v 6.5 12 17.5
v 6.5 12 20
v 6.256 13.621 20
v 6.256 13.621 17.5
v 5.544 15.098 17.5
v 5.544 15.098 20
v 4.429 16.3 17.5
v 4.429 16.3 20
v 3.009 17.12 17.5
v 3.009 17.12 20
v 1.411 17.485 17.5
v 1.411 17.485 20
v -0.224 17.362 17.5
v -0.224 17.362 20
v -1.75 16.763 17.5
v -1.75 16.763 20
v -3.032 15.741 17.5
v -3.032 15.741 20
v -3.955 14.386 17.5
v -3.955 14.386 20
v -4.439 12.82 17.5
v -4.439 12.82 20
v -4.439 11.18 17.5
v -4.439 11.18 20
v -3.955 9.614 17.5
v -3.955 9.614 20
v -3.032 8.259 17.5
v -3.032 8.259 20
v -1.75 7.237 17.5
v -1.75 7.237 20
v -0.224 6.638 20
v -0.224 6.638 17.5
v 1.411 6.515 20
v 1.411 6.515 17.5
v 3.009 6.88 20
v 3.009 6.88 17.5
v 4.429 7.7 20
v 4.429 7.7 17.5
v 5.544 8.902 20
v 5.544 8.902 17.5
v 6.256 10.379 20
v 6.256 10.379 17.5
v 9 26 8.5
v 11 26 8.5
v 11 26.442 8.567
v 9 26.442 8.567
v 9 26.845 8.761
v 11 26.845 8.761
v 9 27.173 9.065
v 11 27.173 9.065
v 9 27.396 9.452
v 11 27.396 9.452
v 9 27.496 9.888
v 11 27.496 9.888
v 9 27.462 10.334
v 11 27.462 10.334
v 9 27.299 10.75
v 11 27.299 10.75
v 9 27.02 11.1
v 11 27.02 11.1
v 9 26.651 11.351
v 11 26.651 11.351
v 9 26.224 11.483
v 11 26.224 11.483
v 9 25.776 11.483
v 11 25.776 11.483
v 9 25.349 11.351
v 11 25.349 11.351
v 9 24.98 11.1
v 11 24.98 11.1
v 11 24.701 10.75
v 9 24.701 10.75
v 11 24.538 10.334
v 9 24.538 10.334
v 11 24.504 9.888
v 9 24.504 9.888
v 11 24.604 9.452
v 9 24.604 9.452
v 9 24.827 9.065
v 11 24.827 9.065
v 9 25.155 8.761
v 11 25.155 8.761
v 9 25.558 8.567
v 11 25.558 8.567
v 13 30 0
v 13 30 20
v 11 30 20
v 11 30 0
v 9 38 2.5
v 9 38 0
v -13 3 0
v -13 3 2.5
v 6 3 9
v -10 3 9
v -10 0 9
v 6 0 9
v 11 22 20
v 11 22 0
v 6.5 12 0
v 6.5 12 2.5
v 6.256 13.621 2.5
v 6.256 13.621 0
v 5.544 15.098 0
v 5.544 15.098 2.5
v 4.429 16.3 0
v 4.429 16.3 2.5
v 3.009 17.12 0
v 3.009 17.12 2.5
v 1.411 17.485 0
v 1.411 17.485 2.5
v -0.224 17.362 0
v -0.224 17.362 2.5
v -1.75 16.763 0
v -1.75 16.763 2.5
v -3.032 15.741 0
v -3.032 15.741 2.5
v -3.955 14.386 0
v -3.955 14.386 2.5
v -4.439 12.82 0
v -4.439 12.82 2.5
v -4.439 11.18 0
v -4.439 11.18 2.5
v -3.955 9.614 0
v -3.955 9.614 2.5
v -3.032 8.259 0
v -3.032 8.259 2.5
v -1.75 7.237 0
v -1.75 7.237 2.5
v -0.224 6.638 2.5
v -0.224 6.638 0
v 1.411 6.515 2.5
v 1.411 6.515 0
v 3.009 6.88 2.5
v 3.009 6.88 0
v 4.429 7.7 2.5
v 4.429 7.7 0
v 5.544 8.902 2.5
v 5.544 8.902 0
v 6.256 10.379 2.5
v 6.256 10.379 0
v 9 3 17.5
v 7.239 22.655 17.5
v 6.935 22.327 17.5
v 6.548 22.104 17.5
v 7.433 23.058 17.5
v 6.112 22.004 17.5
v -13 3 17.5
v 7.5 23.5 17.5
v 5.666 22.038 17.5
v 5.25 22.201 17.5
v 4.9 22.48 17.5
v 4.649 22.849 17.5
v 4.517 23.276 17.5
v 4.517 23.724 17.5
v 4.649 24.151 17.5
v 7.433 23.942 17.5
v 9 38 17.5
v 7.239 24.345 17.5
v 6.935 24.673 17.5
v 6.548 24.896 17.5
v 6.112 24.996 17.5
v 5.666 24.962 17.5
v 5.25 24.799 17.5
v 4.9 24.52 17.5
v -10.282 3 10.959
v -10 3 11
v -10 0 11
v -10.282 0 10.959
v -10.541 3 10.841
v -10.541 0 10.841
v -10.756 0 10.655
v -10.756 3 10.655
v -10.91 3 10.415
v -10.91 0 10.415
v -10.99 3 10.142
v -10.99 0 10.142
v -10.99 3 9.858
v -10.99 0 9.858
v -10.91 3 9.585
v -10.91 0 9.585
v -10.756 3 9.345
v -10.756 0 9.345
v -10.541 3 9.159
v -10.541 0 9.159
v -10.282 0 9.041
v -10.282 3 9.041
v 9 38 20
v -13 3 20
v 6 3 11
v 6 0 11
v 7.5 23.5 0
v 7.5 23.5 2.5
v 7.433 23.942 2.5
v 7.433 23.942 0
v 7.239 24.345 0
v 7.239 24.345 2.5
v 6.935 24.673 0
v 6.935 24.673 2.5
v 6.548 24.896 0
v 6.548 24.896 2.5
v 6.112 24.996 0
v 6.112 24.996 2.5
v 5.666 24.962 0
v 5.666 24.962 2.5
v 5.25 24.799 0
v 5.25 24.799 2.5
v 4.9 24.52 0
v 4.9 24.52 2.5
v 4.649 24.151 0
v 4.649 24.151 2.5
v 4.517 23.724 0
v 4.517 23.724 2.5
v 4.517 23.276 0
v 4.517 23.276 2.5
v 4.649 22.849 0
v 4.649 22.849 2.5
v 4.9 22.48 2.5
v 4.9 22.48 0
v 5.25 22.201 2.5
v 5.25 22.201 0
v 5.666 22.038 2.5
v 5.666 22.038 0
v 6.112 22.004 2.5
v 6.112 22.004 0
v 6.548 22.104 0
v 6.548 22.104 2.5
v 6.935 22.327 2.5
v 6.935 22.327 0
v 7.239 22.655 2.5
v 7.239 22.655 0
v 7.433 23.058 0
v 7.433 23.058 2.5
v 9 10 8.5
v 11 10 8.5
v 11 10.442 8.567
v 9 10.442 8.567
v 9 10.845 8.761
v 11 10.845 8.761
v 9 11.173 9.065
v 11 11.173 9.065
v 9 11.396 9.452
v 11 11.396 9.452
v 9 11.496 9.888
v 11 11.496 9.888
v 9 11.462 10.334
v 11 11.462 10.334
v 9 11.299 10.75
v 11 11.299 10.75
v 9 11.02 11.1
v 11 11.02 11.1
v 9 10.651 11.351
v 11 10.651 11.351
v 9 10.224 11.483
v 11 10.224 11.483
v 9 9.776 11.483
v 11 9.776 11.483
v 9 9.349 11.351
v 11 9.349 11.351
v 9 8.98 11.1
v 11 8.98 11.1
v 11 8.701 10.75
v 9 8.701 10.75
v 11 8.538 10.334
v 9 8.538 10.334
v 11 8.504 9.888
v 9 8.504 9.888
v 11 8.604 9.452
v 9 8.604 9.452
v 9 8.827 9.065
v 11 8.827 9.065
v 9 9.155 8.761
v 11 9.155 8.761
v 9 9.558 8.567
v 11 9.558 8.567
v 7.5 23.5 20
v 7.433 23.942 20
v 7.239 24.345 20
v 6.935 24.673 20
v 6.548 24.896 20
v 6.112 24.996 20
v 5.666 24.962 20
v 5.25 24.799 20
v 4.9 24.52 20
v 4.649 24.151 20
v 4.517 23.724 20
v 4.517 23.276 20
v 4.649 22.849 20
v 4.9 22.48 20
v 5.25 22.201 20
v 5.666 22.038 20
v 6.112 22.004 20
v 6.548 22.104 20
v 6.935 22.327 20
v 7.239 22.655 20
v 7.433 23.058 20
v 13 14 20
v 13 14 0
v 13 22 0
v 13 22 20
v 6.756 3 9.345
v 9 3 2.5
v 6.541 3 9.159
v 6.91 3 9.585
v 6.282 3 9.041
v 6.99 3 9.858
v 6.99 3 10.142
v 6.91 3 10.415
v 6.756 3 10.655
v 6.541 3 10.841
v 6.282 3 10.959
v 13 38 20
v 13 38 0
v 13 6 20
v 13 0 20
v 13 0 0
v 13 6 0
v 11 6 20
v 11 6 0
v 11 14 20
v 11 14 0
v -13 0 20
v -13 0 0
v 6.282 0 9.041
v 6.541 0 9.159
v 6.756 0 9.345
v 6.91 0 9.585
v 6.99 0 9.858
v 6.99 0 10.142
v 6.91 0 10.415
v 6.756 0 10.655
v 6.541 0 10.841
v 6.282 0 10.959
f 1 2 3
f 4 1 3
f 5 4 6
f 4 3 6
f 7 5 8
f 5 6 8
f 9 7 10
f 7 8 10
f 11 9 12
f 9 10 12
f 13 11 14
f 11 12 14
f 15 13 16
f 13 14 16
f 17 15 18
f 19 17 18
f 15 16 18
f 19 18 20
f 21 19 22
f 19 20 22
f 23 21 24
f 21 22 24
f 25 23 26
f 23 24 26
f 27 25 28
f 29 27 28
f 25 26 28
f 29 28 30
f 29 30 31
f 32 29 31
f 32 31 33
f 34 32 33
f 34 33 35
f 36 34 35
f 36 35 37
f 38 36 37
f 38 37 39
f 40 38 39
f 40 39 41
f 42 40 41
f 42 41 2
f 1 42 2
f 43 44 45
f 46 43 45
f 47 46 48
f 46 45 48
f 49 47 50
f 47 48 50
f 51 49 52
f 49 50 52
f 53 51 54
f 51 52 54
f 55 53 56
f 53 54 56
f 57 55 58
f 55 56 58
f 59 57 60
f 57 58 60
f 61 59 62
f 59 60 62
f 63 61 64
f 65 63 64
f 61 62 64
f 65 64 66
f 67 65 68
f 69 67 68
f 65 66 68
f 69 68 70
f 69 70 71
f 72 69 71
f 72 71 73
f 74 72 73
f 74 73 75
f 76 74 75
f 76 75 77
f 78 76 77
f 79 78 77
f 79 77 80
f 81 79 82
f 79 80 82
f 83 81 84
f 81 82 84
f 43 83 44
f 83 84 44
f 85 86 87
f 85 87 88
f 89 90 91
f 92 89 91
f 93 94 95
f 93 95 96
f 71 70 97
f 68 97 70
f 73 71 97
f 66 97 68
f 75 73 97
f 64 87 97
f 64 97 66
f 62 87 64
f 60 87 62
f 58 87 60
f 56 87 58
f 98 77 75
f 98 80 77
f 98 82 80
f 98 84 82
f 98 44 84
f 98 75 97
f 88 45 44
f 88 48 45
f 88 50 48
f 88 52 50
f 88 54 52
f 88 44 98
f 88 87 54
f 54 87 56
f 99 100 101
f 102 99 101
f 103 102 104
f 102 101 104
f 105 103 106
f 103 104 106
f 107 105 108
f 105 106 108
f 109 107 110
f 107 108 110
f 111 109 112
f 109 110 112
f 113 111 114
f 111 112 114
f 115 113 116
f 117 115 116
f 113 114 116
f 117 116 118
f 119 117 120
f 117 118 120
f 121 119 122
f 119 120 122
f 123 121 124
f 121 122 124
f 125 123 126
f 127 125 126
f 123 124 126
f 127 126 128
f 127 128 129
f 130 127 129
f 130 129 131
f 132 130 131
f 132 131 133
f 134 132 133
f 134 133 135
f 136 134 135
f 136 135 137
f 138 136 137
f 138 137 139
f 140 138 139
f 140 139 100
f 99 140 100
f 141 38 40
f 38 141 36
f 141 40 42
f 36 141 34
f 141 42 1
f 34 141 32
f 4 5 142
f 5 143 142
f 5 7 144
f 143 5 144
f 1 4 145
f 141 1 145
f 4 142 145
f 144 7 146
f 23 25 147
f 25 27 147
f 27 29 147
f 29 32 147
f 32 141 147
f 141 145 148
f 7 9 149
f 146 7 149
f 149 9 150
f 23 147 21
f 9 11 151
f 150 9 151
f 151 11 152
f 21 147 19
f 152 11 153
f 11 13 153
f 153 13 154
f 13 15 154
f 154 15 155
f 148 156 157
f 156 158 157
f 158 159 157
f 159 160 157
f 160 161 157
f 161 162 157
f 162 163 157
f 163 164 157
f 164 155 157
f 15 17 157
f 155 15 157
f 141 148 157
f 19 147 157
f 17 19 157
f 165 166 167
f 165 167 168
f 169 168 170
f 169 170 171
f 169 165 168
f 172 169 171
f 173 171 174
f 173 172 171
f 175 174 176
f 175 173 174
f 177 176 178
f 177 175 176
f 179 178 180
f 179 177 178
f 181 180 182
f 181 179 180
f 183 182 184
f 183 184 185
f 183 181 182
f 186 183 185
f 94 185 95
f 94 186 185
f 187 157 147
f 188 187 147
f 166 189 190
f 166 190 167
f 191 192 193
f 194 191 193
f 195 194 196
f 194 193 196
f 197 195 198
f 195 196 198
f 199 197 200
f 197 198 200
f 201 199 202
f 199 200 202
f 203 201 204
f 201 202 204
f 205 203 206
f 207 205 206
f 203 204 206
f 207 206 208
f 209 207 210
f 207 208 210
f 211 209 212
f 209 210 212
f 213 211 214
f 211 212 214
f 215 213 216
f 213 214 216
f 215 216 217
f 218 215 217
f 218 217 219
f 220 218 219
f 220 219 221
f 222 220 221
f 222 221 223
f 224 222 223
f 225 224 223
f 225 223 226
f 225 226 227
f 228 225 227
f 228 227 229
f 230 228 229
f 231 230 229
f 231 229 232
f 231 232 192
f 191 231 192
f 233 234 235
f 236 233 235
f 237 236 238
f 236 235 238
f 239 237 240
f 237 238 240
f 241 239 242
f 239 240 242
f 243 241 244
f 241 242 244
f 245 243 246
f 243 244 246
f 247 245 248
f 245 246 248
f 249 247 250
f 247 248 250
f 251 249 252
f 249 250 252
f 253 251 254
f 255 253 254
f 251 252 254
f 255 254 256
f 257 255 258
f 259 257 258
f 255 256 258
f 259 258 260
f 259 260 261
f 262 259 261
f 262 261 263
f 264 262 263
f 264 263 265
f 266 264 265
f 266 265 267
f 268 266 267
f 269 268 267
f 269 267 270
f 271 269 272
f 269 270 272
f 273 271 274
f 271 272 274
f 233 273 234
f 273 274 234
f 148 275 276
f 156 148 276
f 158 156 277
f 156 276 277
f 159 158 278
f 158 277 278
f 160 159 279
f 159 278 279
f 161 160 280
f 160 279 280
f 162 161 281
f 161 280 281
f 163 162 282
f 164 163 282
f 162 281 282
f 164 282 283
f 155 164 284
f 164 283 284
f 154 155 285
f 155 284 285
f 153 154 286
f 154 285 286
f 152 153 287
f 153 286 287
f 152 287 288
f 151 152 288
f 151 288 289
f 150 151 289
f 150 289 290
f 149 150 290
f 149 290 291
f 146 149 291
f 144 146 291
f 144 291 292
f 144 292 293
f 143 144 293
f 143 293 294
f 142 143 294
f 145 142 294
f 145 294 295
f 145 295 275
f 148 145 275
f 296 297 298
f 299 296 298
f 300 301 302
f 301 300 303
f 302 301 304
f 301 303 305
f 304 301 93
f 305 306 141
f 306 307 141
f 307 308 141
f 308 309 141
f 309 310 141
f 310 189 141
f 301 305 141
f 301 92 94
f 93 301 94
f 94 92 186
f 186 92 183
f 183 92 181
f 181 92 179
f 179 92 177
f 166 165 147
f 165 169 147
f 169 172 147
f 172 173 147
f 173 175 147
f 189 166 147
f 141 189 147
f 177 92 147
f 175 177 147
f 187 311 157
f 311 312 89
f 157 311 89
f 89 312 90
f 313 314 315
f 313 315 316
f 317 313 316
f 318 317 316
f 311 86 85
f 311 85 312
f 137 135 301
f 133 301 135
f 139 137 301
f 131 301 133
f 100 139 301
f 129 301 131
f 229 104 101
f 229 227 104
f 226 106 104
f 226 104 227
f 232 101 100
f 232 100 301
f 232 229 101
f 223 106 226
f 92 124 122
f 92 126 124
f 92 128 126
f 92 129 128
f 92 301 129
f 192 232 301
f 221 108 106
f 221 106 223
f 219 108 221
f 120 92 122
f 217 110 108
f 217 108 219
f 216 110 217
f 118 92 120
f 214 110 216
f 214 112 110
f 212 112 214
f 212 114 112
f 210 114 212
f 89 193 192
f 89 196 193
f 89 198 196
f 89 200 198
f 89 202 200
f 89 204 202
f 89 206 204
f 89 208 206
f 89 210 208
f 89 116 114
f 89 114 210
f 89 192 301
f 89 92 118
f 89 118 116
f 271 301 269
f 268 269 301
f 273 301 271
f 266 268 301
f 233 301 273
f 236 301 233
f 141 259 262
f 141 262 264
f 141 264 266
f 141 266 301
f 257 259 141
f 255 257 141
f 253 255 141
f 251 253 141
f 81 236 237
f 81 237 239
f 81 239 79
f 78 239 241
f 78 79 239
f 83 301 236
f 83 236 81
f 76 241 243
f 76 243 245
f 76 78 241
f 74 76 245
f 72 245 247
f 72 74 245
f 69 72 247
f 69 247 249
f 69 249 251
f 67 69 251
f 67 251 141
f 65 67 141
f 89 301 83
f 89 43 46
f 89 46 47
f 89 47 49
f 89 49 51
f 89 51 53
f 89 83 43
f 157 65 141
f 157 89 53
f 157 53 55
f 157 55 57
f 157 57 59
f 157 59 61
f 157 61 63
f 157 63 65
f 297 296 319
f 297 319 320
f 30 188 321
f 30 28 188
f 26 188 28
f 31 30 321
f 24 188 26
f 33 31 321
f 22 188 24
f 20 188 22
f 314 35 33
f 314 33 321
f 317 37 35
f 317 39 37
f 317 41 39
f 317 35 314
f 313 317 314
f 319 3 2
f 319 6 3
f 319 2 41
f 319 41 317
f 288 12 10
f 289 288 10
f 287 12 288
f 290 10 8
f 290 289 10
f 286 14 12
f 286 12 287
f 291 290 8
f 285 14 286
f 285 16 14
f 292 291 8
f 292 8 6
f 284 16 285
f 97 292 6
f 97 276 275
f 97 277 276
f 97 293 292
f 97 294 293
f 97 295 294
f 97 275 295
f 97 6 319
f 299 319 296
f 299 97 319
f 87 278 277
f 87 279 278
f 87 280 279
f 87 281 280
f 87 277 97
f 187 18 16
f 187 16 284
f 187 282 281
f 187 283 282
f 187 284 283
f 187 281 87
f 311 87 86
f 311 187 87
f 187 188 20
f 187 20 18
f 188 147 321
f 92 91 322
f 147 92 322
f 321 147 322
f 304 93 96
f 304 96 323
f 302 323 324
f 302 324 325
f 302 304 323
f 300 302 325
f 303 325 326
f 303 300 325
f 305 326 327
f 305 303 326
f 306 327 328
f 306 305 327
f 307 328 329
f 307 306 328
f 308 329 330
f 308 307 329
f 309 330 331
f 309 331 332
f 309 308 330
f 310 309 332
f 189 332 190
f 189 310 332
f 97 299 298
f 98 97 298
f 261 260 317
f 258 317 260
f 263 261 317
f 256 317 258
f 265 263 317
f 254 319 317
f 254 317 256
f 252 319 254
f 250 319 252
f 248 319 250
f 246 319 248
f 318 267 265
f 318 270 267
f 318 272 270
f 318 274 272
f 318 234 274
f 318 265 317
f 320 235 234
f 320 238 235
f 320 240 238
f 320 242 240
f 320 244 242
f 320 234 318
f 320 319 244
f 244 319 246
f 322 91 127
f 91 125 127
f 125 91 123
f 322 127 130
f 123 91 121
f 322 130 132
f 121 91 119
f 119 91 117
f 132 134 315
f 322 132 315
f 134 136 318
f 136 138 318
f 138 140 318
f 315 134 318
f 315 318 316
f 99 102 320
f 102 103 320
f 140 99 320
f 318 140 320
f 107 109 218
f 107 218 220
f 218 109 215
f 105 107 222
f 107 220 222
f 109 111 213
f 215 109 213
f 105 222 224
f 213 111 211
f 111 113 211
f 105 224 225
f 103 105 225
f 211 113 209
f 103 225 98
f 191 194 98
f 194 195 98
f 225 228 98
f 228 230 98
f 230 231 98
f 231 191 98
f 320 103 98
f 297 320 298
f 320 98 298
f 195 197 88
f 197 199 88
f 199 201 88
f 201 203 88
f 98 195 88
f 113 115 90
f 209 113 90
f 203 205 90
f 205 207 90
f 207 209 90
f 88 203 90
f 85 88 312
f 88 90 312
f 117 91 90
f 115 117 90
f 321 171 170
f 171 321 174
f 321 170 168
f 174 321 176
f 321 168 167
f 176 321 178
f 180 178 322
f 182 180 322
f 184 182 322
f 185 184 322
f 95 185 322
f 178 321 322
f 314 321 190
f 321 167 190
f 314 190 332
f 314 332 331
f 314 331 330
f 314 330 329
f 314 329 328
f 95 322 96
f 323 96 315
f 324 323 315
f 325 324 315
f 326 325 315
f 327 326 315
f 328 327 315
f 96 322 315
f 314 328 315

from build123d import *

# Parameters (mm, degrees)
BOSS_EXTRUDE1_DEPTH = 20
SKETCH2_W           = 20
SKETCH2_H           = 8
CUT_EXTRUDE1_DEPTH  = 2
SKETCH4_W           = 15
SKETCH4_H           = 35
CUT_EXTRUDE2_DEPTH  = 22
SKETCH5_R           = 1.5
SKETCH5_R_2         = 5.5
CUT_EXTRUDE3_DEPTH  = 20
SKETCH6_R           = 1.5
CUT_EXTRUDE4_DEPTH  = 2
CUT_EXTRUDE5_DEPTH  = 3


with BuildPart() as part:
    # Sketch1 → Boss-Extrude1 (new body)
    with BuildSketch(Plane.XY):
        Polygon((-13, 0), (13, 0), (13, 38), (9, 38), (-13, 3), align=None)
    extrude(amount=BOSS_EXTRUDE1_DEPTH)

    # Sketch2 → Cut-Extrude1 (cut)
    with BuildSketch(Plane(origin=(13, 0, 0), x_dir=(0, 0, -1), z_dir=(1, 0, 0))):
        with Locations((-10, 10)):
            Rectangle(SKETCH2_W, SKETCH2_H)
        with Locations((-10, 26)):
            Rectangle(SKETCH2_W, SKETCH2_H)
    extrude(amount=-CUT_EXTRUDE1_DEPTH, mode=Mode.SUBTRACT)

    # Sketch4 → Cut-Extrude2 (cut)
    with BuildSketch(Plane.ZY.offset(13)):
        with Locations((10, 20.5)):
            Rectangle(SKETCH4_W, SKETCH4_H)
    extrude(amount=-CUT_EXTRUDE2_DEPTH, mode=Mode.SUBTRACT)

    # Sketch5 → Cut-Extrude3 (cut)
    with BuildSketch(Plane.XY.offset(20)):
        with Locations((6, 23.5)):
            Circle(SKETCH5_R)
        with Locations((1, 12)):
            Circle(SKETCH5_R_2)
    extrude(amount=-CUT_EXTRUDE3_DEPTH, mode=Mode.SUBTRACT)

    # Sketch6 → Cut-Extrude4 (cut)
    with BuildSketch(Plane(origin=(11, 0, 0), x_dir=(0, 0, -1), z_dir=(1, 0, 0))):
        with Locations((-10, 26)):
            Circle(SKETCH6_R)
        with Locations((-10, 10)):
            Circle(SKETCH6_R)
    extrude(amount=-CUT_EXTRUDE4_DEPTH, mode=Mode.SUBTRACT)

    # Sketch7 → Cut-Extrude5 (cut)
    with BuildSketch(Plane(origin=(0, 3, 0), x_dir=(1, 0, 0), z_dir=(0, 1, 0))):
        with BuildLine():
            Line((-10, -9), (6, -9))
            ThreePointArc((6, -9), (7, -10), (6, -11))
            Line((6, -11), (-10, -11))
            ThreePointArc((-10, -11), (-11, -10), (-10, -9))
        make_face()
    extrude(amount=-CUT_EXTRUDE5_DEPTH, mode=Mode.SUBTRACT)


solid = part.part
